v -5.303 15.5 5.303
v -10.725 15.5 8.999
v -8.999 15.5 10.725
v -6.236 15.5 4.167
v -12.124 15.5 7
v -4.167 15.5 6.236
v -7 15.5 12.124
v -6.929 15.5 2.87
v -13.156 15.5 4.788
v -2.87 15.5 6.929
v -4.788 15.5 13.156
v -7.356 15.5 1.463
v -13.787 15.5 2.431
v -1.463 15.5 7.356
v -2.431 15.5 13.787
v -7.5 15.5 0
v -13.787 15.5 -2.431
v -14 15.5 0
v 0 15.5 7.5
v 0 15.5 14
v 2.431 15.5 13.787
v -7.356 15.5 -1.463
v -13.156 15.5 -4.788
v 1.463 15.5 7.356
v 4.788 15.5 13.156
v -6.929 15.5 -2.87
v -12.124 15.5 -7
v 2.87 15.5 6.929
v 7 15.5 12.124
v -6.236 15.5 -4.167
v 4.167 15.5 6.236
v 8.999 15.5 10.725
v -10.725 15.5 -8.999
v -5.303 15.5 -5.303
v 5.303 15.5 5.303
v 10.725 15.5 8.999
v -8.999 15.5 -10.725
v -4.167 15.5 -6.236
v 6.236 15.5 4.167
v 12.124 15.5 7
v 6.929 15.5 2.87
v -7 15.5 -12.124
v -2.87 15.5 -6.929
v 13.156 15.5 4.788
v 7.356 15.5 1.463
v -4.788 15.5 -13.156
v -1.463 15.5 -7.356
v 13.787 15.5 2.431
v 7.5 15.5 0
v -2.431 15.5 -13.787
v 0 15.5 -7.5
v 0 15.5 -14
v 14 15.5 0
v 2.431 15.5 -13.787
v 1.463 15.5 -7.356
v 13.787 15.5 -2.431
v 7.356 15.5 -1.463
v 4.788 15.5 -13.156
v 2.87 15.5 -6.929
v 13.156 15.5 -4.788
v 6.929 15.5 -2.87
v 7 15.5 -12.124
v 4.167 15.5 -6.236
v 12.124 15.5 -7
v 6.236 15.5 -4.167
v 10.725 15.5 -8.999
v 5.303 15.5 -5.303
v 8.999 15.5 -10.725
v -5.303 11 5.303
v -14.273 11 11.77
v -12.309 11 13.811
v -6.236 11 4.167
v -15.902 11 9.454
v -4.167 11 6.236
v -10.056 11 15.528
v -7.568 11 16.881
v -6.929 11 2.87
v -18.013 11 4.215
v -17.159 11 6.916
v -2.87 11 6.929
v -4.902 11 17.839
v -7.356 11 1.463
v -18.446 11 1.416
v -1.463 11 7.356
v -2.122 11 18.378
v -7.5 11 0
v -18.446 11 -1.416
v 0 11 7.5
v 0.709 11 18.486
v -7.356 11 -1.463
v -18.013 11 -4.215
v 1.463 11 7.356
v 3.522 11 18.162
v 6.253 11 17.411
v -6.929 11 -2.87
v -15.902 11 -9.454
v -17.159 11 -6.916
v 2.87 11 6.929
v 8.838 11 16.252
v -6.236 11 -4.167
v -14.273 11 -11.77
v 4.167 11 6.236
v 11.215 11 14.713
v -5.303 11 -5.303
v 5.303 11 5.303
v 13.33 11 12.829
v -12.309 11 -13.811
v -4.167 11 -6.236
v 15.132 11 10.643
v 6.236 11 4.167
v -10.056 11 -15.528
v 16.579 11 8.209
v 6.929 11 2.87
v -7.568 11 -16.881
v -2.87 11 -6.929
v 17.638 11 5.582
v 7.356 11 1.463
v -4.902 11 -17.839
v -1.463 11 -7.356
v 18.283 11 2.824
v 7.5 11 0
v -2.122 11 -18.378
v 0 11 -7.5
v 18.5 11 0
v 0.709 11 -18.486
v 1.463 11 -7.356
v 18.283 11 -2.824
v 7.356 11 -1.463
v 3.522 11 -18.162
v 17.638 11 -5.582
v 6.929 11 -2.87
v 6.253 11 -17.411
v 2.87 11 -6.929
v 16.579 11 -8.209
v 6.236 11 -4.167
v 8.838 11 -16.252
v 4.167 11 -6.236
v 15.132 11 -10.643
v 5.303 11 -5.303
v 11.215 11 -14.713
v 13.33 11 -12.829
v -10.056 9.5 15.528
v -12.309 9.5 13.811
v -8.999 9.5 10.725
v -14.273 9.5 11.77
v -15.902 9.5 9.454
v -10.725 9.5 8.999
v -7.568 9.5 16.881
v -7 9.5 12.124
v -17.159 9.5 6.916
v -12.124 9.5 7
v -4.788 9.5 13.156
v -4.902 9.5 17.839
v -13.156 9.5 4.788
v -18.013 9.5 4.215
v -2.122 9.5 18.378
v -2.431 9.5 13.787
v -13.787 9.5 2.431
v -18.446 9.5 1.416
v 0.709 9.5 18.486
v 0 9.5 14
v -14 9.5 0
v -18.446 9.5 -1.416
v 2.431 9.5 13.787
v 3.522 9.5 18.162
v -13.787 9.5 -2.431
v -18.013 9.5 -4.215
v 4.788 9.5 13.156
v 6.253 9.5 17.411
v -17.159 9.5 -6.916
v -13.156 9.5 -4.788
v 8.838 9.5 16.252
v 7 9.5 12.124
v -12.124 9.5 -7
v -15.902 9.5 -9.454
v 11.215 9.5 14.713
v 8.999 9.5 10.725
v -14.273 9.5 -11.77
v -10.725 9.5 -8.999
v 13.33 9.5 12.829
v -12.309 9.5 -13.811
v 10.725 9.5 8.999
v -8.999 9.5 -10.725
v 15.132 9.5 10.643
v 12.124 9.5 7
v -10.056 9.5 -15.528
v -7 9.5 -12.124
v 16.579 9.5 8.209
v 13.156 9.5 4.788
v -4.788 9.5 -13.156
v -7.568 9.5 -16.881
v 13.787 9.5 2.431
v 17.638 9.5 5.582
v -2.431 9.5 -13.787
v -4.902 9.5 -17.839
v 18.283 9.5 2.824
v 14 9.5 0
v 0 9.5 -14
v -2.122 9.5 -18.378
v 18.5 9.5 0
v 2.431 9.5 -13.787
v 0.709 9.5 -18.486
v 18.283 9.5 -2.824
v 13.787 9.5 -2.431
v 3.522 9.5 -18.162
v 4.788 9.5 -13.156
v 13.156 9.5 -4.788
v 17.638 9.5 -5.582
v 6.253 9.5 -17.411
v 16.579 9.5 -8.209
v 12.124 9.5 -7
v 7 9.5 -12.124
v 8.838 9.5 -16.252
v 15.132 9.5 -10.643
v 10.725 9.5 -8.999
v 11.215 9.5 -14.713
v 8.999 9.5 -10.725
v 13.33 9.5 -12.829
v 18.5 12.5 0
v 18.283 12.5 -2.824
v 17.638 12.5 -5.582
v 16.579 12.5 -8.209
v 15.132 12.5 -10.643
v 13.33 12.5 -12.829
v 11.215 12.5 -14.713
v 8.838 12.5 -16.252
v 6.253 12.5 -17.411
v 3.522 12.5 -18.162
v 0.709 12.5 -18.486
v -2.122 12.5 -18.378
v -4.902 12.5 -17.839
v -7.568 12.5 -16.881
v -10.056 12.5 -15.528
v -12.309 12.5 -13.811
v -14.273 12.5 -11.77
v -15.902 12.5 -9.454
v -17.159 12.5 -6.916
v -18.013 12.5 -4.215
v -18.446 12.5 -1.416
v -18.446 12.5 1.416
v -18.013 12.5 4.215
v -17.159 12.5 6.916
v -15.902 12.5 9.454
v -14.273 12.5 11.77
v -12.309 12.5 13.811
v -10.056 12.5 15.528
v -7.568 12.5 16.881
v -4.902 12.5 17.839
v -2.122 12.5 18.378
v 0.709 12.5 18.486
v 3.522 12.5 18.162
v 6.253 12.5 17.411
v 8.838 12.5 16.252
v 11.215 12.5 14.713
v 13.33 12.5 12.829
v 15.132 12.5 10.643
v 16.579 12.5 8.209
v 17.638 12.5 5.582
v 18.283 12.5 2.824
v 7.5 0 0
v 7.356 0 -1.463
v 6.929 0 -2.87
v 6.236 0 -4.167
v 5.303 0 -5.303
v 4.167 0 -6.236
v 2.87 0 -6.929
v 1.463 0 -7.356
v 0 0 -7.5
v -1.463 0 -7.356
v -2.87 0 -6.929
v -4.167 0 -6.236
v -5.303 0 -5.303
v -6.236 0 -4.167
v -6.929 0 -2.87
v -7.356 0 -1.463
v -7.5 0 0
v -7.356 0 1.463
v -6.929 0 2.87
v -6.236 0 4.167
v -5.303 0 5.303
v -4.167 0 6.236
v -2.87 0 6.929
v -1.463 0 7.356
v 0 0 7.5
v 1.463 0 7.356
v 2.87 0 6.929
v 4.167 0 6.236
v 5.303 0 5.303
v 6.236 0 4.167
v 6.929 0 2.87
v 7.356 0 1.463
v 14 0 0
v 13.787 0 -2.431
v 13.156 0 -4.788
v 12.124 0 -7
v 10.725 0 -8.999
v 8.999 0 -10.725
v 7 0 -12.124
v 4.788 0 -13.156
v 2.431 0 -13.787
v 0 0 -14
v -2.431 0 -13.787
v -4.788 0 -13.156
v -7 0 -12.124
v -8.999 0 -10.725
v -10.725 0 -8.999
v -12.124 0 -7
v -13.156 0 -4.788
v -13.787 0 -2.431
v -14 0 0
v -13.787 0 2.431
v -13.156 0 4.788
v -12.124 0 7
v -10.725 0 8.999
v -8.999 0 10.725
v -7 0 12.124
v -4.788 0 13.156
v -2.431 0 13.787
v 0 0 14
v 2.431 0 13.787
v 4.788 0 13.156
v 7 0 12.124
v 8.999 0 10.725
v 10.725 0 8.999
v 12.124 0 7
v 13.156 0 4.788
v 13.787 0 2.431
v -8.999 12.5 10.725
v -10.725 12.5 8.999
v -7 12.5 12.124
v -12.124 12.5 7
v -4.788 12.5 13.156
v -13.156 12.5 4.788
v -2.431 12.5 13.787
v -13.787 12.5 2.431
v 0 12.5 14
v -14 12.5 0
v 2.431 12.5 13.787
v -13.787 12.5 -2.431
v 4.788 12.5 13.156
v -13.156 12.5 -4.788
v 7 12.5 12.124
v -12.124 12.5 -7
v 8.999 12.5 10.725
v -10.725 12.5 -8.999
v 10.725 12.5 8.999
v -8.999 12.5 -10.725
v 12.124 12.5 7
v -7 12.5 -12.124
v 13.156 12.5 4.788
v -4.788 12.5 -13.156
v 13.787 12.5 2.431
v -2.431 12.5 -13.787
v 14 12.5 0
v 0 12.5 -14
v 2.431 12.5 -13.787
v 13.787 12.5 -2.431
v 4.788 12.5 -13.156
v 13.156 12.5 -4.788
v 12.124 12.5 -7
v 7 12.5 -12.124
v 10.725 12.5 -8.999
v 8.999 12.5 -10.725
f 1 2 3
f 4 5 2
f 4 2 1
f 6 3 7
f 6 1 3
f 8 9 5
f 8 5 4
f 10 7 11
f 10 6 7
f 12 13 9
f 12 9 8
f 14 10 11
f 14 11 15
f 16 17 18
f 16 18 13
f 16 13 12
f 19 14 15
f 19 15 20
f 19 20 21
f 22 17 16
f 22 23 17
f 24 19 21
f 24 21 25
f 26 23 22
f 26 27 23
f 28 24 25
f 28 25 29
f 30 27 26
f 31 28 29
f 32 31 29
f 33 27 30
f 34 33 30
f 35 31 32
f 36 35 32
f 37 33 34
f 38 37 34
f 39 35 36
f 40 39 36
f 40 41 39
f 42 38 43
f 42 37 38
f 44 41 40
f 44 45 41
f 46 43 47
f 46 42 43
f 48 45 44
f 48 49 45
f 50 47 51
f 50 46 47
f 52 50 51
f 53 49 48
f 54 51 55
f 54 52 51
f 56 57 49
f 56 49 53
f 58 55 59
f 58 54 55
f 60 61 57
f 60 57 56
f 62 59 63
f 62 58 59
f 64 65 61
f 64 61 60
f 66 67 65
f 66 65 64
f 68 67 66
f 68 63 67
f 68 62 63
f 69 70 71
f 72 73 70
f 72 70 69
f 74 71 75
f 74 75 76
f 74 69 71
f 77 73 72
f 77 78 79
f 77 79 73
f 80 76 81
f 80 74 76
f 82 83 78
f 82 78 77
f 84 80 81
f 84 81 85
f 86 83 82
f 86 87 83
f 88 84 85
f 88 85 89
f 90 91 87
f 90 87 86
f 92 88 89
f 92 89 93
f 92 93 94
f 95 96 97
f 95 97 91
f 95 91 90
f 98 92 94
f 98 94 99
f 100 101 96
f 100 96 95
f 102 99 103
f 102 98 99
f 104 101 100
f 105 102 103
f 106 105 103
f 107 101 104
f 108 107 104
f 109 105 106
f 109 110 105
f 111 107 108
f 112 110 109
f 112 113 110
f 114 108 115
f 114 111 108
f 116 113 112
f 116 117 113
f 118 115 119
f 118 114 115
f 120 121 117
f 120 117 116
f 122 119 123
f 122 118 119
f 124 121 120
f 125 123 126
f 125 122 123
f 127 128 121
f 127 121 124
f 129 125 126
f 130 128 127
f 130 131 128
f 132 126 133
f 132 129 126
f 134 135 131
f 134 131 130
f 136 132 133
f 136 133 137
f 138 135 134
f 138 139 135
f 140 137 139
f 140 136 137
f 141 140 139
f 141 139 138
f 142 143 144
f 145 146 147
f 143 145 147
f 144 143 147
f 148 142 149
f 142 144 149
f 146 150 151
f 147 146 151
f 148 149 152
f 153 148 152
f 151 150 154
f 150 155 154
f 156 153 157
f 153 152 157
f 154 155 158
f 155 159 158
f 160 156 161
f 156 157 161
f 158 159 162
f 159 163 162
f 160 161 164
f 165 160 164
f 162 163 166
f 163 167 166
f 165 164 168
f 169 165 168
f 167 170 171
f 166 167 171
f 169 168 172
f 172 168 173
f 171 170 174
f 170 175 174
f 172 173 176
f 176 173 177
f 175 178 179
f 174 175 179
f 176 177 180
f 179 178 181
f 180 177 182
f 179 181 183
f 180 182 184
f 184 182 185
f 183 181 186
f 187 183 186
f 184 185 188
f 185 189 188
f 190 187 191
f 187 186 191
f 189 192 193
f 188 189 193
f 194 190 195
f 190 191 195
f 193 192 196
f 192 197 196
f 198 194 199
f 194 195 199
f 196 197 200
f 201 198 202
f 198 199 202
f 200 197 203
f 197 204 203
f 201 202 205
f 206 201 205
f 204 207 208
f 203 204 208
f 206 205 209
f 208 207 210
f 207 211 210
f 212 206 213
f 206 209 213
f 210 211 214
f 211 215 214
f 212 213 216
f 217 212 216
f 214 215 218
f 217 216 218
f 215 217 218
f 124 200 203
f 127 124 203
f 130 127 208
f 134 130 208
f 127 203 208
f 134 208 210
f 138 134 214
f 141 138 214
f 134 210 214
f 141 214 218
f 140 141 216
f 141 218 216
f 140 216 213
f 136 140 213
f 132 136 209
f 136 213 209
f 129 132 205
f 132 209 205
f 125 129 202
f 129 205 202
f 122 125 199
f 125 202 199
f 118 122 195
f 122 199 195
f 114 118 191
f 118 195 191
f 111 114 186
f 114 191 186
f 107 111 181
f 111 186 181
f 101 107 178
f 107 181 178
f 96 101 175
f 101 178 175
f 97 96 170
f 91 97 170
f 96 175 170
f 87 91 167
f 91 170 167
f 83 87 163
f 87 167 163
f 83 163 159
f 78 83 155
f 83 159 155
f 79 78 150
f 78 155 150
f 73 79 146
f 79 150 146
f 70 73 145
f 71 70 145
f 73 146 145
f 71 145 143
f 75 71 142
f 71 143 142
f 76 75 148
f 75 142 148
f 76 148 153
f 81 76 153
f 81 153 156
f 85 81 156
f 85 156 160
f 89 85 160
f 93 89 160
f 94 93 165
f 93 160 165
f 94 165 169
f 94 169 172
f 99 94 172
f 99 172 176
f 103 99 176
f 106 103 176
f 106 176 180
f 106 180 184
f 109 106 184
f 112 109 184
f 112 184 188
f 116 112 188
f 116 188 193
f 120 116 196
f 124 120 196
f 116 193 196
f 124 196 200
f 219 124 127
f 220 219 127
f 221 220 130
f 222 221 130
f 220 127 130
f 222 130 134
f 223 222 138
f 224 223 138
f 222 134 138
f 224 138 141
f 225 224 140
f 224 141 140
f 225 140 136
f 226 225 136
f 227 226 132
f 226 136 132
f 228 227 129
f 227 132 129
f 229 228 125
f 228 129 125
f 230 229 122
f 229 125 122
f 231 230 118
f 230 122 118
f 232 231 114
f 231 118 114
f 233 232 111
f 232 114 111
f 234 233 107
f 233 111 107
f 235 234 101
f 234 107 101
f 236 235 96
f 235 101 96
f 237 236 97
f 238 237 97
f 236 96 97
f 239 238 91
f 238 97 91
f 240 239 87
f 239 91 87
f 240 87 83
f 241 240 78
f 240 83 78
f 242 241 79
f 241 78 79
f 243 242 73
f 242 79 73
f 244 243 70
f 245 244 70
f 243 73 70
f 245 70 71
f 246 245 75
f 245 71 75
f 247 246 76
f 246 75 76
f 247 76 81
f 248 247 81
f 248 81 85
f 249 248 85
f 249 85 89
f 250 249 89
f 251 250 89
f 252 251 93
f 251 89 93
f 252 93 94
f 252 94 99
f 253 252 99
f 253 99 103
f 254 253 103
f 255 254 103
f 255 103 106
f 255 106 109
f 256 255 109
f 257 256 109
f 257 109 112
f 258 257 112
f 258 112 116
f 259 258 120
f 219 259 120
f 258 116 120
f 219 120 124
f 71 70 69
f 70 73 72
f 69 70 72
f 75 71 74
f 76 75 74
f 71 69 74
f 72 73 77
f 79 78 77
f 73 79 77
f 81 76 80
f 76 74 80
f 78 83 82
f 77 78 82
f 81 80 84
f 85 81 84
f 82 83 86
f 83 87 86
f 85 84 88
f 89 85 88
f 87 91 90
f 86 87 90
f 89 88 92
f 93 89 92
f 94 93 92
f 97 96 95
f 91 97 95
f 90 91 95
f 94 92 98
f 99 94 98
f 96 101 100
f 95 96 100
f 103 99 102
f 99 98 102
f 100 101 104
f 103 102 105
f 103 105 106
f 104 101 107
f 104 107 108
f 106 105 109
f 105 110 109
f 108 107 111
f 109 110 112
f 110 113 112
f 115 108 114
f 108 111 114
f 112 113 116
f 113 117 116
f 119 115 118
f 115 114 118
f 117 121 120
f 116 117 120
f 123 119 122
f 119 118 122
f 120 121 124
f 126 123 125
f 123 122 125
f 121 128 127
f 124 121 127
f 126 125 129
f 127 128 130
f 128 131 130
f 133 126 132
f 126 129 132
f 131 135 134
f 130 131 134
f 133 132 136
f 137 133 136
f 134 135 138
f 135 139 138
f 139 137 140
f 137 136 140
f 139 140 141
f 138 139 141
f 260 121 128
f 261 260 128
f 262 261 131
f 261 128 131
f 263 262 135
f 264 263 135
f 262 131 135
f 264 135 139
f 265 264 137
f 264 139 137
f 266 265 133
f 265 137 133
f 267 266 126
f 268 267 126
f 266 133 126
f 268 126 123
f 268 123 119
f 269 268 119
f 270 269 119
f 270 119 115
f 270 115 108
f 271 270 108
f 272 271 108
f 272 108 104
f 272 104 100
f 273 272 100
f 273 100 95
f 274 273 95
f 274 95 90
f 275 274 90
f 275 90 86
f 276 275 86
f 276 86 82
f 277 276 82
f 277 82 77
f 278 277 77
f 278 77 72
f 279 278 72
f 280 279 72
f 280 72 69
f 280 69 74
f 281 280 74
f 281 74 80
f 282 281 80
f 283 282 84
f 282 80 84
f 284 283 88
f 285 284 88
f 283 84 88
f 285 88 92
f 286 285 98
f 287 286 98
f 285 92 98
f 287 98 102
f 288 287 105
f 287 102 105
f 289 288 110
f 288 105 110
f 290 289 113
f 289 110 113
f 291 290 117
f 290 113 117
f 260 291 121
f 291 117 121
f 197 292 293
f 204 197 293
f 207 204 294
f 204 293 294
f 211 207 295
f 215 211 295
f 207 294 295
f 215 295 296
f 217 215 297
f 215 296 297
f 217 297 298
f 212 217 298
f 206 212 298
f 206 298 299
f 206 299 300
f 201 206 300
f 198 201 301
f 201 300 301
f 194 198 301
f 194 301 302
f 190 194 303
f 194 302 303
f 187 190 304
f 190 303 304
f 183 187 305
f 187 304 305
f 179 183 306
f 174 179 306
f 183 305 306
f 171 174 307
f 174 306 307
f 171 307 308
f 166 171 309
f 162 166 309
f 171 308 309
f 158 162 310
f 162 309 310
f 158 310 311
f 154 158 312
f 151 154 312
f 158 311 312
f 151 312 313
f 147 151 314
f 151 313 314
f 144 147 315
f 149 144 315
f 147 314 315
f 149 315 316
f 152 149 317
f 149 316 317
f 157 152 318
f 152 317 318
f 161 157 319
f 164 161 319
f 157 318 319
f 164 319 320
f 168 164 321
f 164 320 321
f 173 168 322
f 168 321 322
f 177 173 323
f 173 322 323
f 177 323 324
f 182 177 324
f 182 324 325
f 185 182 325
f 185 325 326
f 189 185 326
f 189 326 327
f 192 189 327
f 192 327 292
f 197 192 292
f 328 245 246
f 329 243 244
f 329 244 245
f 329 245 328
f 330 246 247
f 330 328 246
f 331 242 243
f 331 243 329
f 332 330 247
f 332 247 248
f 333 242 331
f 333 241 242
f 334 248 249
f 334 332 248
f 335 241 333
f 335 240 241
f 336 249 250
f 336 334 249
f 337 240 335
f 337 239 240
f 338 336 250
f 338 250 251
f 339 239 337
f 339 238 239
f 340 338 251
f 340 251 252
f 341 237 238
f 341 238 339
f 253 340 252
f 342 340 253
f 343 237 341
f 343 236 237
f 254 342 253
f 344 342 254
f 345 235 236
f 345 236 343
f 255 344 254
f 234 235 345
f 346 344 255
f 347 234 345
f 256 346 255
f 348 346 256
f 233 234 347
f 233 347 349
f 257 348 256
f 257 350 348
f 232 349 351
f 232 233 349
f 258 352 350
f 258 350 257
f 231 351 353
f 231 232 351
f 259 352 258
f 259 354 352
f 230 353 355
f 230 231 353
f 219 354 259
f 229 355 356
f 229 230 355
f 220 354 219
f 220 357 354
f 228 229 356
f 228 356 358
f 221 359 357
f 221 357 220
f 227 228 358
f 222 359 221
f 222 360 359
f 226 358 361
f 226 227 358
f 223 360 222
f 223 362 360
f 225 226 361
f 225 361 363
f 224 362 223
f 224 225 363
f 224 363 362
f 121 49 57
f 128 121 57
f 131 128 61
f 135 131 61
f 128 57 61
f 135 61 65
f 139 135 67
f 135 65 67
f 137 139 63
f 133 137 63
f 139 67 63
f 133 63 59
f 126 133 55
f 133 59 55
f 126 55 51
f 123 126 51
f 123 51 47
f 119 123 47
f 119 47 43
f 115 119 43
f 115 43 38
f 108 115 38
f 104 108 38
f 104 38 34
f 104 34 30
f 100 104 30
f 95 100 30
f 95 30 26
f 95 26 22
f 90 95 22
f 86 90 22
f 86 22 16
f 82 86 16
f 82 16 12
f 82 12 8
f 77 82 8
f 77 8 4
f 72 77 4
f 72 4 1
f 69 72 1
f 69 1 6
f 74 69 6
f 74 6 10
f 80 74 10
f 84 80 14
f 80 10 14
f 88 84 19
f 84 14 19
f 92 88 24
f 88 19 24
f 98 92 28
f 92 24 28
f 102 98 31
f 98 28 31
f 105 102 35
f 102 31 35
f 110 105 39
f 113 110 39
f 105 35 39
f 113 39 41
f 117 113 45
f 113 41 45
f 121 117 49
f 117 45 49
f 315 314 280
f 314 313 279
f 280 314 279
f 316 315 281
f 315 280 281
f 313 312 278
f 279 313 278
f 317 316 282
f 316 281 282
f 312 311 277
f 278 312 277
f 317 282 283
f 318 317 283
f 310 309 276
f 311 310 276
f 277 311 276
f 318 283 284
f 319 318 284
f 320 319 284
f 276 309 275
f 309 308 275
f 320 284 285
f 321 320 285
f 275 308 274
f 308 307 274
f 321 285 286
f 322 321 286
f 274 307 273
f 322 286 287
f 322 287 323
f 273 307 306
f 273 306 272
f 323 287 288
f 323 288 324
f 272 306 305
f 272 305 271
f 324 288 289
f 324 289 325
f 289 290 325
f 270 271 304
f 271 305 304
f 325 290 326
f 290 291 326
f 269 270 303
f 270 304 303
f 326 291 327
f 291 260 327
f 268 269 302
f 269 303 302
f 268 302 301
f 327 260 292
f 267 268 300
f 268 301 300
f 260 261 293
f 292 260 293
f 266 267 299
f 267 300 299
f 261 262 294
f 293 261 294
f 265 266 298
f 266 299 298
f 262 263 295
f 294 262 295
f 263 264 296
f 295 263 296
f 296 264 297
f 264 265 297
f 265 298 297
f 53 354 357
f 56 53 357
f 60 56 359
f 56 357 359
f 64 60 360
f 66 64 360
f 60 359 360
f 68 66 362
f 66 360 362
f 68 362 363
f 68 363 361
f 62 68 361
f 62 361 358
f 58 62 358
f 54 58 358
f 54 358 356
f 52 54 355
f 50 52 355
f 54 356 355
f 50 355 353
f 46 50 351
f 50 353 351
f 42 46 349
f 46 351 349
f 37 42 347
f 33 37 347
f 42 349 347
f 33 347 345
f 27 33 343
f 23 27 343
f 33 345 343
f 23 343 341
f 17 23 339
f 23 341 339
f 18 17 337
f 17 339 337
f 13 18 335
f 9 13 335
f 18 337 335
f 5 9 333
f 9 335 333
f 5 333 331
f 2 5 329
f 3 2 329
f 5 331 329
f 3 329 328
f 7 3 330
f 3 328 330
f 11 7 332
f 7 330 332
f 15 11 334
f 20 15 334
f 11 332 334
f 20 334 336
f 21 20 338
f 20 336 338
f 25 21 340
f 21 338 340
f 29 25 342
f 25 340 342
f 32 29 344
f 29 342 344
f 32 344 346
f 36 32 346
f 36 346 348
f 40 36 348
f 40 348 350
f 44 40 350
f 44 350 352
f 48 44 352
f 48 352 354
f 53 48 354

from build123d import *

# Parameters (mm, degrees)
SKETCH2_R           = 14
BOSS_EXTRUDE1_DEPTH = 9.5
SKETCH3_R           = 18.5
BOSS_EXTRUDE2_DEPTH = 1.5
SKETCH4_R           = 18.5
BOSS_EXTRUDE5_DEPTH = 1.5
SKETCH7_R           = 14
BOSS_EXTRUDE6_DEPTH = 3
SKETCH8_R           = 7.5
CUT_EXTRUDE2_DEPTH  = 16.5


with BuildPart() as part:
    # Sketch2 → Boss-Extrude1 (new body)
    with BuildSketch(Plane(origin=(0, 0, 0), x_dir=(1, 0, 0), z_dir=(0, 1, 0))):
        Circle(SKETCH2_R)
    extrude(amount=BOSS_EXTRUDE1_DEPTH)

    # Sketch3 → Boss-Extrude2 (add)
    with BuildSketch(Plane(origin=(0, 9.5, 0), x_dir=(1, 0, 0), z_dir=(0, 1, 0))):
        Circle(SKETCH3_R)
    extrude(amount=BOSS_EXTRUDE2_DEPTH)


with BuildPart() as body_2:
    # Sketch4 → Boss-Extrude5 (new body)
    with BuildSketch(Plane(origin=(0, 11, 0), x_dir=(1, 0, 0), z_dir=(0, 1, 0))):
        Circle(SKETCH4_R)
    extrude(amount=BOSS_EXTRUDE5_DEPTH)

    # Sketch7 → Boss-Extrude6 (add)
    with BuildSketch(Plane(origin=(0, 12.5, 0), x_dir=(1, 0, 0), z_dir=(0, 1, 0))):
        Circle(SKETCH7_R)
    extrude(amount=BOSS_EXTRUDE6_DEPTH)


with BuildPart() as cut_extrude2_tool:
    # Sketch8 → Cut-Extrude2 (new body, through all)
    with BuildSketch(Plane(origin=(0, 15.5, 0), x_dir=(1, 0, 0), z_dir=(0, 1, 0))):
        Circle(SKETCH8_R)
    extrude(amount=-CUT_EXTRUDE2_DEPTH)


with BuildPart() as part_1:
    add(part.part)

    # Cut-Extrude2: cut by cut_extrude2_tool
    add(cut_extrude2_tool.part, mode=Mode.SUBTRACT)


with BuildPart() as body_2_1:
    add(body_2.part)

    # Cut-Extrude2: cut by cut_extrude2_tool
    add(cut_extrude2_tool.part, mode=Mode.SUBTRACT)


solid = Compound([part_1.part, body_2_1.part])
